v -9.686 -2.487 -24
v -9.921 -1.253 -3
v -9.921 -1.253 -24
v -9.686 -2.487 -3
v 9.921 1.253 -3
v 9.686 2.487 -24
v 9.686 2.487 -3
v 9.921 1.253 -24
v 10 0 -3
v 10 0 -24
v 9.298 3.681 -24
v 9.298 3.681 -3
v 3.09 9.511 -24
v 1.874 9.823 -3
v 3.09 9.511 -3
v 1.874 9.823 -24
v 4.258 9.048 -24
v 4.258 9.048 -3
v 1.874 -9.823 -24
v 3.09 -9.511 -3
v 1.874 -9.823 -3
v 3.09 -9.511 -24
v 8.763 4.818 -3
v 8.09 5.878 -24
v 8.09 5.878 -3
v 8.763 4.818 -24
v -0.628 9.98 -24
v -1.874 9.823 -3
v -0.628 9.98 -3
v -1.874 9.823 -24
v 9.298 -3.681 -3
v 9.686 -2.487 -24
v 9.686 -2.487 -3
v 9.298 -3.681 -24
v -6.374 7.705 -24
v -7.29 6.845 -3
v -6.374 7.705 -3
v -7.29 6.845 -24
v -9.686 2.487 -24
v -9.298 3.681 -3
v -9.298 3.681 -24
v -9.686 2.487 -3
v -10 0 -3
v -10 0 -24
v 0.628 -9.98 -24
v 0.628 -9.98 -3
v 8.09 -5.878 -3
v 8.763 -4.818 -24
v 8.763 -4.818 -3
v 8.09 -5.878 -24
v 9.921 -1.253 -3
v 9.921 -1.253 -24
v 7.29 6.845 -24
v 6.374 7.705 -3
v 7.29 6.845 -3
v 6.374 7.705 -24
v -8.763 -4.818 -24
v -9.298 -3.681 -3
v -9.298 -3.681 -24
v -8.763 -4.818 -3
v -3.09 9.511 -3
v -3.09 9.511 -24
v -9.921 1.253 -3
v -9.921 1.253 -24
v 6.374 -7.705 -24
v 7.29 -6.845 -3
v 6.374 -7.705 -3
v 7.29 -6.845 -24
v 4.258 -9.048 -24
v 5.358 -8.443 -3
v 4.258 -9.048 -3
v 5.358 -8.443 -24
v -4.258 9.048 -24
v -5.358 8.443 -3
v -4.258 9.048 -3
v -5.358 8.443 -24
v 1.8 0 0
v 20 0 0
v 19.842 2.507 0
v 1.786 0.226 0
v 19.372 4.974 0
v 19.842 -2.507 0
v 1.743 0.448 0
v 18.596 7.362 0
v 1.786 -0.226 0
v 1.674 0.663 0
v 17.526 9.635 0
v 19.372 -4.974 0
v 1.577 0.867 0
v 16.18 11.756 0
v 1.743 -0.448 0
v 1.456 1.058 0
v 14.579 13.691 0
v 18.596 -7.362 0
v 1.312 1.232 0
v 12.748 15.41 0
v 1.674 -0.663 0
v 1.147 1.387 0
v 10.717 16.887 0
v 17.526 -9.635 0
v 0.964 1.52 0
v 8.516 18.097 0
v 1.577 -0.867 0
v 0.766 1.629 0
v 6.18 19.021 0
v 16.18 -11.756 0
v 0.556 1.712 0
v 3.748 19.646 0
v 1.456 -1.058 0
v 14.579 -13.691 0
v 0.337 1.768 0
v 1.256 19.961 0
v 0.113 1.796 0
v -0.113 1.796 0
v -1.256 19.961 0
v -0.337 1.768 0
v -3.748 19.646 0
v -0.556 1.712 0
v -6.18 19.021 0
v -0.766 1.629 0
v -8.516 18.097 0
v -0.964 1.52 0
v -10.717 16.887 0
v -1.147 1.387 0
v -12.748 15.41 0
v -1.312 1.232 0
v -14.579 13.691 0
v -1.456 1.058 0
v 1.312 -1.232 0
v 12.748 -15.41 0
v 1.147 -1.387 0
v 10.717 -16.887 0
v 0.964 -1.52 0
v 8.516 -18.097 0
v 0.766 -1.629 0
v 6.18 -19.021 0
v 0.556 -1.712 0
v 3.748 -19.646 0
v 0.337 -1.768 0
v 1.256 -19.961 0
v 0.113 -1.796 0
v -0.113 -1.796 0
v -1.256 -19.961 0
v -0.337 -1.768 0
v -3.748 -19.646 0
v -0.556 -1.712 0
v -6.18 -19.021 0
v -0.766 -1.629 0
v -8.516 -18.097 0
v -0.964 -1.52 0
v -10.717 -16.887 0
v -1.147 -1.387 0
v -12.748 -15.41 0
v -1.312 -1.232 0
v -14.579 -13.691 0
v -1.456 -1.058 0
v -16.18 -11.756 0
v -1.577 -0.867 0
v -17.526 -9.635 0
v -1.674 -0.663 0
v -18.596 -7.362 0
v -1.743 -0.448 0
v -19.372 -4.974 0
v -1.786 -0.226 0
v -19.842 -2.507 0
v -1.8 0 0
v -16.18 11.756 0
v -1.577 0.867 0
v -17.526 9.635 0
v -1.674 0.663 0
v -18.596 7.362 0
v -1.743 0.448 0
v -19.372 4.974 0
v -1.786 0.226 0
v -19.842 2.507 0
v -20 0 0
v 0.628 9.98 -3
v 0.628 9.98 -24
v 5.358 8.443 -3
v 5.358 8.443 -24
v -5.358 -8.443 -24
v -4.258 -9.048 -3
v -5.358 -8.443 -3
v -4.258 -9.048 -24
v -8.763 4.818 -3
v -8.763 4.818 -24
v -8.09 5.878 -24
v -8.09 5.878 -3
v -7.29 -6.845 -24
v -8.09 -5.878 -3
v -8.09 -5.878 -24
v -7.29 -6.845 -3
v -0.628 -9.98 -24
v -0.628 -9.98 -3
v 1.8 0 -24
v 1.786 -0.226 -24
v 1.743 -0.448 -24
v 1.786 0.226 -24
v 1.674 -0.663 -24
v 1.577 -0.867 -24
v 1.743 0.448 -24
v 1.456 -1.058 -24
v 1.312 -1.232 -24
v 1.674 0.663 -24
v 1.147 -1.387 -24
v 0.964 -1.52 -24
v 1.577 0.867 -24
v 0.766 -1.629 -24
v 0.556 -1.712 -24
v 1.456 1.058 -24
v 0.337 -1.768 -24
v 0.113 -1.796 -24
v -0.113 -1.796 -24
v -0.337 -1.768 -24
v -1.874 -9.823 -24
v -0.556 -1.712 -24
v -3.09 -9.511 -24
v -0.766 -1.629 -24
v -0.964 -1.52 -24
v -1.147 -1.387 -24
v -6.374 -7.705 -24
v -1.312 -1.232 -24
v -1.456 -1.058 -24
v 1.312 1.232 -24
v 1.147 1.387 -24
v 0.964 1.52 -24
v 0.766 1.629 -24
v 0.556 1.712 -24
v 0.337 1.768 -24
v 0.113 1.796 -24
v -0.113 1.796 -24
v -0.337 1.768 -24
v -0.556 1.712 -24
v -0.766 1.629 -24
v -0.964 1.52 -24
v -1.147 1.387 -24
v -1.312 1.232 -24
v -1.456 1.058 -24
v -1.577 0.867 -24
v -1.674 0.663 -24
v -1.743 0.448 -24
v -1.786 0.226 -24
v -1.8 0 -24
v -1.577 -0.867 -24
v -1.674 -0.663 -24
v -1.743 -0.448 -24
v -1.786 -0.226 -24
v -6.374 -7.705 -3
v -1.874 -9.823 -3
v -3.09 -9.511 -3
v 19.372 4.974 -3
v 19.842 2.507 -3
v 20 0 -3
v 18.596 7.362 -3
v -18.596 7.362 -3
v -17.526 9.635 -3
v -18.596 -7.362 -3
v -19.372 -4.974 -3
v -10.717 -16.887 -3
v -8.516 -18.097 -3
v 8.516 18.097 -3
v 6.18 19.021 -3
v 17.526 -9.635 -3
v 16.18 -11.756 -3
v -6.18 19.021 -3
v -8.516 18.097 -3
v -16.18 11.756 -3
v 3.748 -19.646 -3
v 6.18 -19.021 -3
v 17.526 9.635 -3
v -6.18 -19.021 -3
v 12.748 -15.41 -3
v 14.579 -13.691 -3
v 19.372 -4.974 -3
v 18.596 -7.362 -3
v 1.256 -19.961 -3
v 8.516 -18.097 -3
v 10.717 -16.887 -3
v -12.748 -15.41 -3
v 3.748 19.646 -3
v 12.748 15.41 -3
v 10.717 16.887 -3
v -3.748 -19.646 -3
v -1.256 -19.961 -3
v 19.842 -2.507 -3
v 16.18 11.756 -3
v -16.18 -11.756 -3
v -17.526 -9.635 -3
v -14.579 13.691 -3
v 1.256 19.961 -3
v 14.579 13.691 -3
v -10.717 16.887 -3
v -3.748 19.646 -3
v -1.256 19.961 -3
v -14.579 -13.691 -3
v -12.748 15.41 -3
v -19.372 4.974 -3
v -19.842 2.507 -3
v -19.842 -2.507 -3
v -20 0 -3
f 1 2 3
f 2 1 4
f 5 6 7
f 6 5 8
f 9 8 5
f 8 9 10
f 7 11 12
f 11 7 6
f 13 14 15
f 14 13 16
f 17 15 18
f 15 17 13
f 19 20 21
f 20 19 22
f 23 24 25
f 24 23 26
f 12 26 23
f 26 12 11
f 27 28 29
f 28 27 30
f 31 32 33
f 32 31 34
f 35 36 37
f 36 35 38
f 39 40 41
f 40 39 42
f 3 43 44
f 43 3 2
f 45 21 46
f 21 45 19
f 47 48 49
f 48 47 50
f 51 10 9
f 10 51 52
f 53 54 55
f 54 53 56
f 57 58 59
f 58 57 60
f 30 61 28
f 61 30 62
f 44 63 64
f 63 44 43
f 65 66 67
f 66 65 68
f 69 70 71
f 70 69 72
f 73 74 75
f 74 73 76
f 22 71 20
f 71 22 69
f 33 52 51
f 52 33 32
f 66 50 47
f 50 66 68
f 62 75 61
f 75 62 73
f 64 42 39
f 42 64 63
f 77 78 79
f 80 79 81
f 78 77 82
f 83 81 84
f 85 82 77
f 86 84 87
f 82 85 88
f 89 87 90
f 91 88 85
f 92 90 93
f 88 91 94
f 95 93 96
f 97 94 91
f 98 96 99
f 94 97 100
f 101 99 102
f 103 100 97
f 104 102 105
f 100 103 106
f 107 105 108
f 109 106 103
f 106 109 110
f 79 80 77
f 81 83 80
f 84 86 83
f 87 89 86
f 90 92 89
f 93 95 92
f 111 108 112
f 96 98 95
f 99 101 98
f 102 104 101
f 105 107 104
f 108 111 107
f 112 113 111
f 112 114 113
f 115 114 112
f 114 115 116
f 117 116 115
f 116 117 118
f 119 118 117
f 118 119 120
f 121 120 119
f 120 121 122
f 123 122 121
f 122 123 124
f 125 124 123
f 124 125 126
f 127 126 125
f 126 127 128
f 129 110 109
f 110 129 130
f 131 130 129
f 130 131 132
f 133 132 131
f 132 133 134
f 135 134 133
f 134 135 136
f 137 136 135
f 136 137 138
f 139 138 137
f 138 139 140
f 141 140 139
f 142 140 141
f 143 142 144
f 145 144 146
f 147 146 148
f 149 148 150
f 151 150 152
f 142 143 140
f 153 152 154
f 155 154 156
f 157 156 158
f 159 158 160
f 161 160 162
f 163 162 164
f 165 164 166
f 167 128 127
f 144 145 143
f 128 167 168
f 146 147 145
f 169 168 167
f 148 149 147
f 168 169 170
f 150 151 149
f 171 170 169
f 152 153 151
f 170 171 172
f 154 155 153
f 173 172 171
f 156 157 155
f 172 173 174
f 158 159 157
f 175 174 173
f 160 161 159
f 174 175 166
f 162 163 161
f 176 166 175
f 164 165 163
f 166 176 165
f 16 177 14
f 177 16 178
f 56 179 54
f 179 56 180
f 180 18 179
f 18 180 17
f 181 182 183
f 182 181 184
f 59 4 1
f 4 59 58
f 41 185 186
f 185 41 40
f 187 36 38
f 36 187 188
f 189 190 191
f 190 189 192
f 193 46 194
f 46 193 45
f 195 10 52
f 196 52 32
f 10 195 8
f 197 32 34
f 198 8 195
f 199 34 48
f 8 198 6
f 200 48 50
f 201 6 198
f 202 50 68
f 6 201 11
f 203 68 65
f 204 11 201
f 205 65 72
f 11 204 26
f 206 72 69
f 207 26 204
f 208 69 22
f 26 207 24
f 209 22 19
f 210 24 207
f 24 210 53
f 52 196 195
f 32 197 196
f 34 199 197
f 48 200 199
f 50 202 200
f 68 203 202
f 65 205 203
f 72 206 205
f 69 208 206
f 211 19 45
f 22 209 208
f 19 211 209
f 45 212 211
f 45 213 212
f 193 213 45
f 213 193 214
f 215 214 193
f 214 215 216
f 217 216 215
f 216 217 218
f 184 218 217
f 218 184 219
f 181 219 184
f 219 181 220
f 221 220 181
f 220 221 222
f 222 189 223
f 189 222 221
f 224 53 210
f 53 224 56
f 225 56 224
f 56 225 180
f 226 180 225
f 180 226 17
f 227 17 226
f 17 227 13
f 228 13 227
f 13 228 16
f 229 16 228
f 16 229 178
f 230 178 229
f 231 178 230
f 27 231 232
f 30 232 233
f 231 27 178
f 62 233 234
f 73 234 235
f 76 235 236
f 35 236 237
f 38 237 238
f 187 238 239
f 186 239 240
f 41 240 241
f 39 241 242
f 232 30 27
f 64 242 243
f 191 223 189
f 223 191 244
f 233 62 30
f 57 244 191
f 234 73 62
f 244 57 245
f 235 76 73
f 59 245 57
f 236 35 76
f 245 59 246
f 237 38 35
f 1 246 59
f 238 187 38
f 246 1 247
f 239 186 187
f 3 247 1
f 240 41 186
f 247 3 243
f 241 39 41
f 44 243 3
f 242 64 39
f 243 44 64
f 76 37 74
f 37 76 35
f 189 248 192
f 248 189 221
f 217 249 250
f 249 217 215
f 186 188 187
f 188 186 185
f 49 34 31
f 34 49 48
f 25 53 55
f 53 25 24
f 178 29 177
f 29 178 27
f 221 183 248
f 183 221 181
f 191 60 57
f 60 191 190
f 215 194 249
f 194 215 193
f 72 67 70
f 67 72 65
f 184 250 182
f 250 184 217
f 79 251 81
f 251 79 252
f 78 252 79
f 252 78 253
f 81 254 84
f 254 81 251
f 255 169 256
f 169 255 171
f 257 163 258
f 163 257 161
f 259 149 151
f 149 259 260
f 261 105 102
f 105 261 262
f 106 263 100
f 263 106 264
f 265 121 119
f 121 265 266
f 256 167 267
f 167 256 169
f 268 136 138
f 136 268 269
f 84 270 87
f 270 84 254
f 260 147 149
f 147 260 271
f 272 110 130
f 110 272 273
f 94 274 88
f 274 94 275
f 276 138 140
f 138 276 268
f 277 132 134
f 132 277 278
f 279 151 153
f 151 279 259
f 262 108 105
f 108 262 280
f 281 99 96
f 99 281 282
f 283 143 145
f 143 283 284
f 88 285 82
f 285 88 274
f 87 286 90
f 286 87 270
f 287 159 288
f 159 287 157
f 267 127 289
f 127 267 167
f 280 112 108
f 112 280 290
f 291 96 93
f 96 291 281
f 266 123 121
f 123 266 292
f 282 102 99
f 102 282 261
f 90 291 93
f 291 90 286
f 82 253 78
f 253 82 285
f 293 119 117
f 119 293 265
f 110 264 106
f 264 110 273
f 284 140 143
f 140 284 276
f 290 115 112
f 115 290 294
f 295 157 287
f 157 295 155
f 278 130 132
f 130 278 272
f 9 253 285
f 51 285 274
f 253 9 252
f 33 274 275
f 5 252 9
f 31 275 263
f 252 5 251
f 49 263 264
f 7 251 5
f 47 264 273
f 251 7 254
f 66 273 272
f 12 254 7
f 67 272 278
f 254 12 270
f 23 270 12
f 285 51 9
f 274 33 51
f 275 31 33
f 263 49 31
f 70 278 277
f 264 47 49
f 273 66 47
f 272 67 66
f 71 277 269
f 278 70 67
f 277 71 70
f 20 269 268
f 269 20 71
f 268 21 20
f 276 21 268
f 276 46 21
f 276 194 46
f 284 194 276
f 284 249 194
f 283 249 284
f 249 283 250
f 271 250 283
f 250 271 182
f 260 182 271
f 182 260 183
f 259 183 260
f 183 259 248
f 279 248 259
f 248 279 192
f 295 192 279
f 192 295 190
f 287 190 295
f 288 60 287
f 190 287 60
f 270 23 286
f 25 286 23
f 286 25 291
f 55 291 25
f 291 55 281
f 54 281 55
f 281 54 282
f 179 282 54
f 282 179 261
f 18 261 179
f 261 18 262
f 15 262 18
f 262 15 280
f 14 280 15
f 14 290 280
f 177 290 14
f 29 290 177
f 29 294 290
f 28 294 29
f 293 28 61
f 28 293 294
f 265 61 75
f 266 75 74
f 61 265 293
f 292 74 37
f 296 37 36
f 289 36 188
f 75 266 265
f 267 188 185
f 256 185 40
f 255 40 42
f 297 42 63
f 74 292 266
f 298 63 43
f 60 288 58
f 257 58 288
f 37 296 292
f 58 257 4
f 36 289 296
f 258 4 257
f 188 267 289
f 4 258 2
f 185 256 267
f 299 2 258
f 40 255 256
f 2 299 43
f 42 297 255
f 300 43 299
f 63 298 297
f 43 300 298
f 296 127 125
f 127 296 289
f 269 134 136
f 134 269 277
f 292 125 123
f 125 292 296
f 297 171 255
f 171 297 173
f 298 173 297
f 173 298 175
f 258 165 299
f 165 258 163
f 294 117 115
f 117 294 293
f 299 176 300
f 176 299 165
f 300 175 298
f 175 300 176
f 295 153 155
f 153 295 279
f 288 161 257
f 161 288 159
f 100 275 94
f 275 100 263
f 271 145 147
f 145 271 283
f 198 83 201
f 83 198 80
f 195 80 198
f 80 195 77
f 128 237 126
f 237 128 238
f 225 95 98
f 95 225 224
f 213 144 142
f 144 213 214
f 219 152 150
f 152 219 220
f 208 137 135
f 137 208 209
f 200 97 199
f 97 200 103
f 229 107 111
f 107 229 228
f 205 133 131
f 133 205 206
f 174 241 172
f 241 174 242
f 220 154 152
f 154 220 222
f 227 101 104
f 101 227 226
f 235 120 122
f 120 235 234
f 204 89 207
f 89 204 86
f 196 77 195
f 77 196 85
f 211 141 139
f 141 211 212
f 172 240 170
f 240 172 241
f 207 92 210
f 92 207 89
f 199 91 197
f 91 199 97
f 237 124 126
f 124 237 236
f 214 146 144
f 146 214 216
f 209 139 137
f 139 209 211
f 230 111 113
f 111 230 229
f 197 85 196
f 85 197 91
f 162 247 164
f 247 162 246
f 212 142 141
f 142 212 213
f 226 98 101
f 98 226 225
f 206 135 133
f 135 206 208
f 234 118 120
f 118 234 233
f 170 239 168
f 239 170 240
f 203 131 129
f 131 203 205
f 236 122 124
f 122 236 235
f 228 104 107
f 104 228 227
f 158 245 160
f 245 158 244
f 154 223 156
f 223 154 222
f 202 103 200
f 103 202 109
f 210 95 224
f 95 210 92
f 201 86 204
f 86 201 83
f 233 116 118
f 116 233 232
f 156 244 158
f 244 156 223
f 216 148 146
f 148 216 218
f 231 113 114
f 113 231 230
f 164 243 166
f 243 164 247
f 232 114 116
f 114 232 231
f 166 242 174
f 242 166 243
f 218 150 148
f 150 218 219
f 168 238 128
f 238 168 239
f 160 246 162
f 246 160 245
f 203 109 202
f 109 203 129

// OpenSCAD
$fn = 50;


difference() {
	union() {
		translate(v = [0, 0, -24.0000000000]) {
			cylinder(h = 24, r = 10.0000000000);
		}
		translate(v = [0, 0, -3.0000000000]) {
			cylinder(h = 3, r = 20.0000000000);
		}
	}
	union() {
		#translate(v = [0, 0, -24]) {
			cylinder(h = 24, r = 1.8000000000);
		}
	}
}
